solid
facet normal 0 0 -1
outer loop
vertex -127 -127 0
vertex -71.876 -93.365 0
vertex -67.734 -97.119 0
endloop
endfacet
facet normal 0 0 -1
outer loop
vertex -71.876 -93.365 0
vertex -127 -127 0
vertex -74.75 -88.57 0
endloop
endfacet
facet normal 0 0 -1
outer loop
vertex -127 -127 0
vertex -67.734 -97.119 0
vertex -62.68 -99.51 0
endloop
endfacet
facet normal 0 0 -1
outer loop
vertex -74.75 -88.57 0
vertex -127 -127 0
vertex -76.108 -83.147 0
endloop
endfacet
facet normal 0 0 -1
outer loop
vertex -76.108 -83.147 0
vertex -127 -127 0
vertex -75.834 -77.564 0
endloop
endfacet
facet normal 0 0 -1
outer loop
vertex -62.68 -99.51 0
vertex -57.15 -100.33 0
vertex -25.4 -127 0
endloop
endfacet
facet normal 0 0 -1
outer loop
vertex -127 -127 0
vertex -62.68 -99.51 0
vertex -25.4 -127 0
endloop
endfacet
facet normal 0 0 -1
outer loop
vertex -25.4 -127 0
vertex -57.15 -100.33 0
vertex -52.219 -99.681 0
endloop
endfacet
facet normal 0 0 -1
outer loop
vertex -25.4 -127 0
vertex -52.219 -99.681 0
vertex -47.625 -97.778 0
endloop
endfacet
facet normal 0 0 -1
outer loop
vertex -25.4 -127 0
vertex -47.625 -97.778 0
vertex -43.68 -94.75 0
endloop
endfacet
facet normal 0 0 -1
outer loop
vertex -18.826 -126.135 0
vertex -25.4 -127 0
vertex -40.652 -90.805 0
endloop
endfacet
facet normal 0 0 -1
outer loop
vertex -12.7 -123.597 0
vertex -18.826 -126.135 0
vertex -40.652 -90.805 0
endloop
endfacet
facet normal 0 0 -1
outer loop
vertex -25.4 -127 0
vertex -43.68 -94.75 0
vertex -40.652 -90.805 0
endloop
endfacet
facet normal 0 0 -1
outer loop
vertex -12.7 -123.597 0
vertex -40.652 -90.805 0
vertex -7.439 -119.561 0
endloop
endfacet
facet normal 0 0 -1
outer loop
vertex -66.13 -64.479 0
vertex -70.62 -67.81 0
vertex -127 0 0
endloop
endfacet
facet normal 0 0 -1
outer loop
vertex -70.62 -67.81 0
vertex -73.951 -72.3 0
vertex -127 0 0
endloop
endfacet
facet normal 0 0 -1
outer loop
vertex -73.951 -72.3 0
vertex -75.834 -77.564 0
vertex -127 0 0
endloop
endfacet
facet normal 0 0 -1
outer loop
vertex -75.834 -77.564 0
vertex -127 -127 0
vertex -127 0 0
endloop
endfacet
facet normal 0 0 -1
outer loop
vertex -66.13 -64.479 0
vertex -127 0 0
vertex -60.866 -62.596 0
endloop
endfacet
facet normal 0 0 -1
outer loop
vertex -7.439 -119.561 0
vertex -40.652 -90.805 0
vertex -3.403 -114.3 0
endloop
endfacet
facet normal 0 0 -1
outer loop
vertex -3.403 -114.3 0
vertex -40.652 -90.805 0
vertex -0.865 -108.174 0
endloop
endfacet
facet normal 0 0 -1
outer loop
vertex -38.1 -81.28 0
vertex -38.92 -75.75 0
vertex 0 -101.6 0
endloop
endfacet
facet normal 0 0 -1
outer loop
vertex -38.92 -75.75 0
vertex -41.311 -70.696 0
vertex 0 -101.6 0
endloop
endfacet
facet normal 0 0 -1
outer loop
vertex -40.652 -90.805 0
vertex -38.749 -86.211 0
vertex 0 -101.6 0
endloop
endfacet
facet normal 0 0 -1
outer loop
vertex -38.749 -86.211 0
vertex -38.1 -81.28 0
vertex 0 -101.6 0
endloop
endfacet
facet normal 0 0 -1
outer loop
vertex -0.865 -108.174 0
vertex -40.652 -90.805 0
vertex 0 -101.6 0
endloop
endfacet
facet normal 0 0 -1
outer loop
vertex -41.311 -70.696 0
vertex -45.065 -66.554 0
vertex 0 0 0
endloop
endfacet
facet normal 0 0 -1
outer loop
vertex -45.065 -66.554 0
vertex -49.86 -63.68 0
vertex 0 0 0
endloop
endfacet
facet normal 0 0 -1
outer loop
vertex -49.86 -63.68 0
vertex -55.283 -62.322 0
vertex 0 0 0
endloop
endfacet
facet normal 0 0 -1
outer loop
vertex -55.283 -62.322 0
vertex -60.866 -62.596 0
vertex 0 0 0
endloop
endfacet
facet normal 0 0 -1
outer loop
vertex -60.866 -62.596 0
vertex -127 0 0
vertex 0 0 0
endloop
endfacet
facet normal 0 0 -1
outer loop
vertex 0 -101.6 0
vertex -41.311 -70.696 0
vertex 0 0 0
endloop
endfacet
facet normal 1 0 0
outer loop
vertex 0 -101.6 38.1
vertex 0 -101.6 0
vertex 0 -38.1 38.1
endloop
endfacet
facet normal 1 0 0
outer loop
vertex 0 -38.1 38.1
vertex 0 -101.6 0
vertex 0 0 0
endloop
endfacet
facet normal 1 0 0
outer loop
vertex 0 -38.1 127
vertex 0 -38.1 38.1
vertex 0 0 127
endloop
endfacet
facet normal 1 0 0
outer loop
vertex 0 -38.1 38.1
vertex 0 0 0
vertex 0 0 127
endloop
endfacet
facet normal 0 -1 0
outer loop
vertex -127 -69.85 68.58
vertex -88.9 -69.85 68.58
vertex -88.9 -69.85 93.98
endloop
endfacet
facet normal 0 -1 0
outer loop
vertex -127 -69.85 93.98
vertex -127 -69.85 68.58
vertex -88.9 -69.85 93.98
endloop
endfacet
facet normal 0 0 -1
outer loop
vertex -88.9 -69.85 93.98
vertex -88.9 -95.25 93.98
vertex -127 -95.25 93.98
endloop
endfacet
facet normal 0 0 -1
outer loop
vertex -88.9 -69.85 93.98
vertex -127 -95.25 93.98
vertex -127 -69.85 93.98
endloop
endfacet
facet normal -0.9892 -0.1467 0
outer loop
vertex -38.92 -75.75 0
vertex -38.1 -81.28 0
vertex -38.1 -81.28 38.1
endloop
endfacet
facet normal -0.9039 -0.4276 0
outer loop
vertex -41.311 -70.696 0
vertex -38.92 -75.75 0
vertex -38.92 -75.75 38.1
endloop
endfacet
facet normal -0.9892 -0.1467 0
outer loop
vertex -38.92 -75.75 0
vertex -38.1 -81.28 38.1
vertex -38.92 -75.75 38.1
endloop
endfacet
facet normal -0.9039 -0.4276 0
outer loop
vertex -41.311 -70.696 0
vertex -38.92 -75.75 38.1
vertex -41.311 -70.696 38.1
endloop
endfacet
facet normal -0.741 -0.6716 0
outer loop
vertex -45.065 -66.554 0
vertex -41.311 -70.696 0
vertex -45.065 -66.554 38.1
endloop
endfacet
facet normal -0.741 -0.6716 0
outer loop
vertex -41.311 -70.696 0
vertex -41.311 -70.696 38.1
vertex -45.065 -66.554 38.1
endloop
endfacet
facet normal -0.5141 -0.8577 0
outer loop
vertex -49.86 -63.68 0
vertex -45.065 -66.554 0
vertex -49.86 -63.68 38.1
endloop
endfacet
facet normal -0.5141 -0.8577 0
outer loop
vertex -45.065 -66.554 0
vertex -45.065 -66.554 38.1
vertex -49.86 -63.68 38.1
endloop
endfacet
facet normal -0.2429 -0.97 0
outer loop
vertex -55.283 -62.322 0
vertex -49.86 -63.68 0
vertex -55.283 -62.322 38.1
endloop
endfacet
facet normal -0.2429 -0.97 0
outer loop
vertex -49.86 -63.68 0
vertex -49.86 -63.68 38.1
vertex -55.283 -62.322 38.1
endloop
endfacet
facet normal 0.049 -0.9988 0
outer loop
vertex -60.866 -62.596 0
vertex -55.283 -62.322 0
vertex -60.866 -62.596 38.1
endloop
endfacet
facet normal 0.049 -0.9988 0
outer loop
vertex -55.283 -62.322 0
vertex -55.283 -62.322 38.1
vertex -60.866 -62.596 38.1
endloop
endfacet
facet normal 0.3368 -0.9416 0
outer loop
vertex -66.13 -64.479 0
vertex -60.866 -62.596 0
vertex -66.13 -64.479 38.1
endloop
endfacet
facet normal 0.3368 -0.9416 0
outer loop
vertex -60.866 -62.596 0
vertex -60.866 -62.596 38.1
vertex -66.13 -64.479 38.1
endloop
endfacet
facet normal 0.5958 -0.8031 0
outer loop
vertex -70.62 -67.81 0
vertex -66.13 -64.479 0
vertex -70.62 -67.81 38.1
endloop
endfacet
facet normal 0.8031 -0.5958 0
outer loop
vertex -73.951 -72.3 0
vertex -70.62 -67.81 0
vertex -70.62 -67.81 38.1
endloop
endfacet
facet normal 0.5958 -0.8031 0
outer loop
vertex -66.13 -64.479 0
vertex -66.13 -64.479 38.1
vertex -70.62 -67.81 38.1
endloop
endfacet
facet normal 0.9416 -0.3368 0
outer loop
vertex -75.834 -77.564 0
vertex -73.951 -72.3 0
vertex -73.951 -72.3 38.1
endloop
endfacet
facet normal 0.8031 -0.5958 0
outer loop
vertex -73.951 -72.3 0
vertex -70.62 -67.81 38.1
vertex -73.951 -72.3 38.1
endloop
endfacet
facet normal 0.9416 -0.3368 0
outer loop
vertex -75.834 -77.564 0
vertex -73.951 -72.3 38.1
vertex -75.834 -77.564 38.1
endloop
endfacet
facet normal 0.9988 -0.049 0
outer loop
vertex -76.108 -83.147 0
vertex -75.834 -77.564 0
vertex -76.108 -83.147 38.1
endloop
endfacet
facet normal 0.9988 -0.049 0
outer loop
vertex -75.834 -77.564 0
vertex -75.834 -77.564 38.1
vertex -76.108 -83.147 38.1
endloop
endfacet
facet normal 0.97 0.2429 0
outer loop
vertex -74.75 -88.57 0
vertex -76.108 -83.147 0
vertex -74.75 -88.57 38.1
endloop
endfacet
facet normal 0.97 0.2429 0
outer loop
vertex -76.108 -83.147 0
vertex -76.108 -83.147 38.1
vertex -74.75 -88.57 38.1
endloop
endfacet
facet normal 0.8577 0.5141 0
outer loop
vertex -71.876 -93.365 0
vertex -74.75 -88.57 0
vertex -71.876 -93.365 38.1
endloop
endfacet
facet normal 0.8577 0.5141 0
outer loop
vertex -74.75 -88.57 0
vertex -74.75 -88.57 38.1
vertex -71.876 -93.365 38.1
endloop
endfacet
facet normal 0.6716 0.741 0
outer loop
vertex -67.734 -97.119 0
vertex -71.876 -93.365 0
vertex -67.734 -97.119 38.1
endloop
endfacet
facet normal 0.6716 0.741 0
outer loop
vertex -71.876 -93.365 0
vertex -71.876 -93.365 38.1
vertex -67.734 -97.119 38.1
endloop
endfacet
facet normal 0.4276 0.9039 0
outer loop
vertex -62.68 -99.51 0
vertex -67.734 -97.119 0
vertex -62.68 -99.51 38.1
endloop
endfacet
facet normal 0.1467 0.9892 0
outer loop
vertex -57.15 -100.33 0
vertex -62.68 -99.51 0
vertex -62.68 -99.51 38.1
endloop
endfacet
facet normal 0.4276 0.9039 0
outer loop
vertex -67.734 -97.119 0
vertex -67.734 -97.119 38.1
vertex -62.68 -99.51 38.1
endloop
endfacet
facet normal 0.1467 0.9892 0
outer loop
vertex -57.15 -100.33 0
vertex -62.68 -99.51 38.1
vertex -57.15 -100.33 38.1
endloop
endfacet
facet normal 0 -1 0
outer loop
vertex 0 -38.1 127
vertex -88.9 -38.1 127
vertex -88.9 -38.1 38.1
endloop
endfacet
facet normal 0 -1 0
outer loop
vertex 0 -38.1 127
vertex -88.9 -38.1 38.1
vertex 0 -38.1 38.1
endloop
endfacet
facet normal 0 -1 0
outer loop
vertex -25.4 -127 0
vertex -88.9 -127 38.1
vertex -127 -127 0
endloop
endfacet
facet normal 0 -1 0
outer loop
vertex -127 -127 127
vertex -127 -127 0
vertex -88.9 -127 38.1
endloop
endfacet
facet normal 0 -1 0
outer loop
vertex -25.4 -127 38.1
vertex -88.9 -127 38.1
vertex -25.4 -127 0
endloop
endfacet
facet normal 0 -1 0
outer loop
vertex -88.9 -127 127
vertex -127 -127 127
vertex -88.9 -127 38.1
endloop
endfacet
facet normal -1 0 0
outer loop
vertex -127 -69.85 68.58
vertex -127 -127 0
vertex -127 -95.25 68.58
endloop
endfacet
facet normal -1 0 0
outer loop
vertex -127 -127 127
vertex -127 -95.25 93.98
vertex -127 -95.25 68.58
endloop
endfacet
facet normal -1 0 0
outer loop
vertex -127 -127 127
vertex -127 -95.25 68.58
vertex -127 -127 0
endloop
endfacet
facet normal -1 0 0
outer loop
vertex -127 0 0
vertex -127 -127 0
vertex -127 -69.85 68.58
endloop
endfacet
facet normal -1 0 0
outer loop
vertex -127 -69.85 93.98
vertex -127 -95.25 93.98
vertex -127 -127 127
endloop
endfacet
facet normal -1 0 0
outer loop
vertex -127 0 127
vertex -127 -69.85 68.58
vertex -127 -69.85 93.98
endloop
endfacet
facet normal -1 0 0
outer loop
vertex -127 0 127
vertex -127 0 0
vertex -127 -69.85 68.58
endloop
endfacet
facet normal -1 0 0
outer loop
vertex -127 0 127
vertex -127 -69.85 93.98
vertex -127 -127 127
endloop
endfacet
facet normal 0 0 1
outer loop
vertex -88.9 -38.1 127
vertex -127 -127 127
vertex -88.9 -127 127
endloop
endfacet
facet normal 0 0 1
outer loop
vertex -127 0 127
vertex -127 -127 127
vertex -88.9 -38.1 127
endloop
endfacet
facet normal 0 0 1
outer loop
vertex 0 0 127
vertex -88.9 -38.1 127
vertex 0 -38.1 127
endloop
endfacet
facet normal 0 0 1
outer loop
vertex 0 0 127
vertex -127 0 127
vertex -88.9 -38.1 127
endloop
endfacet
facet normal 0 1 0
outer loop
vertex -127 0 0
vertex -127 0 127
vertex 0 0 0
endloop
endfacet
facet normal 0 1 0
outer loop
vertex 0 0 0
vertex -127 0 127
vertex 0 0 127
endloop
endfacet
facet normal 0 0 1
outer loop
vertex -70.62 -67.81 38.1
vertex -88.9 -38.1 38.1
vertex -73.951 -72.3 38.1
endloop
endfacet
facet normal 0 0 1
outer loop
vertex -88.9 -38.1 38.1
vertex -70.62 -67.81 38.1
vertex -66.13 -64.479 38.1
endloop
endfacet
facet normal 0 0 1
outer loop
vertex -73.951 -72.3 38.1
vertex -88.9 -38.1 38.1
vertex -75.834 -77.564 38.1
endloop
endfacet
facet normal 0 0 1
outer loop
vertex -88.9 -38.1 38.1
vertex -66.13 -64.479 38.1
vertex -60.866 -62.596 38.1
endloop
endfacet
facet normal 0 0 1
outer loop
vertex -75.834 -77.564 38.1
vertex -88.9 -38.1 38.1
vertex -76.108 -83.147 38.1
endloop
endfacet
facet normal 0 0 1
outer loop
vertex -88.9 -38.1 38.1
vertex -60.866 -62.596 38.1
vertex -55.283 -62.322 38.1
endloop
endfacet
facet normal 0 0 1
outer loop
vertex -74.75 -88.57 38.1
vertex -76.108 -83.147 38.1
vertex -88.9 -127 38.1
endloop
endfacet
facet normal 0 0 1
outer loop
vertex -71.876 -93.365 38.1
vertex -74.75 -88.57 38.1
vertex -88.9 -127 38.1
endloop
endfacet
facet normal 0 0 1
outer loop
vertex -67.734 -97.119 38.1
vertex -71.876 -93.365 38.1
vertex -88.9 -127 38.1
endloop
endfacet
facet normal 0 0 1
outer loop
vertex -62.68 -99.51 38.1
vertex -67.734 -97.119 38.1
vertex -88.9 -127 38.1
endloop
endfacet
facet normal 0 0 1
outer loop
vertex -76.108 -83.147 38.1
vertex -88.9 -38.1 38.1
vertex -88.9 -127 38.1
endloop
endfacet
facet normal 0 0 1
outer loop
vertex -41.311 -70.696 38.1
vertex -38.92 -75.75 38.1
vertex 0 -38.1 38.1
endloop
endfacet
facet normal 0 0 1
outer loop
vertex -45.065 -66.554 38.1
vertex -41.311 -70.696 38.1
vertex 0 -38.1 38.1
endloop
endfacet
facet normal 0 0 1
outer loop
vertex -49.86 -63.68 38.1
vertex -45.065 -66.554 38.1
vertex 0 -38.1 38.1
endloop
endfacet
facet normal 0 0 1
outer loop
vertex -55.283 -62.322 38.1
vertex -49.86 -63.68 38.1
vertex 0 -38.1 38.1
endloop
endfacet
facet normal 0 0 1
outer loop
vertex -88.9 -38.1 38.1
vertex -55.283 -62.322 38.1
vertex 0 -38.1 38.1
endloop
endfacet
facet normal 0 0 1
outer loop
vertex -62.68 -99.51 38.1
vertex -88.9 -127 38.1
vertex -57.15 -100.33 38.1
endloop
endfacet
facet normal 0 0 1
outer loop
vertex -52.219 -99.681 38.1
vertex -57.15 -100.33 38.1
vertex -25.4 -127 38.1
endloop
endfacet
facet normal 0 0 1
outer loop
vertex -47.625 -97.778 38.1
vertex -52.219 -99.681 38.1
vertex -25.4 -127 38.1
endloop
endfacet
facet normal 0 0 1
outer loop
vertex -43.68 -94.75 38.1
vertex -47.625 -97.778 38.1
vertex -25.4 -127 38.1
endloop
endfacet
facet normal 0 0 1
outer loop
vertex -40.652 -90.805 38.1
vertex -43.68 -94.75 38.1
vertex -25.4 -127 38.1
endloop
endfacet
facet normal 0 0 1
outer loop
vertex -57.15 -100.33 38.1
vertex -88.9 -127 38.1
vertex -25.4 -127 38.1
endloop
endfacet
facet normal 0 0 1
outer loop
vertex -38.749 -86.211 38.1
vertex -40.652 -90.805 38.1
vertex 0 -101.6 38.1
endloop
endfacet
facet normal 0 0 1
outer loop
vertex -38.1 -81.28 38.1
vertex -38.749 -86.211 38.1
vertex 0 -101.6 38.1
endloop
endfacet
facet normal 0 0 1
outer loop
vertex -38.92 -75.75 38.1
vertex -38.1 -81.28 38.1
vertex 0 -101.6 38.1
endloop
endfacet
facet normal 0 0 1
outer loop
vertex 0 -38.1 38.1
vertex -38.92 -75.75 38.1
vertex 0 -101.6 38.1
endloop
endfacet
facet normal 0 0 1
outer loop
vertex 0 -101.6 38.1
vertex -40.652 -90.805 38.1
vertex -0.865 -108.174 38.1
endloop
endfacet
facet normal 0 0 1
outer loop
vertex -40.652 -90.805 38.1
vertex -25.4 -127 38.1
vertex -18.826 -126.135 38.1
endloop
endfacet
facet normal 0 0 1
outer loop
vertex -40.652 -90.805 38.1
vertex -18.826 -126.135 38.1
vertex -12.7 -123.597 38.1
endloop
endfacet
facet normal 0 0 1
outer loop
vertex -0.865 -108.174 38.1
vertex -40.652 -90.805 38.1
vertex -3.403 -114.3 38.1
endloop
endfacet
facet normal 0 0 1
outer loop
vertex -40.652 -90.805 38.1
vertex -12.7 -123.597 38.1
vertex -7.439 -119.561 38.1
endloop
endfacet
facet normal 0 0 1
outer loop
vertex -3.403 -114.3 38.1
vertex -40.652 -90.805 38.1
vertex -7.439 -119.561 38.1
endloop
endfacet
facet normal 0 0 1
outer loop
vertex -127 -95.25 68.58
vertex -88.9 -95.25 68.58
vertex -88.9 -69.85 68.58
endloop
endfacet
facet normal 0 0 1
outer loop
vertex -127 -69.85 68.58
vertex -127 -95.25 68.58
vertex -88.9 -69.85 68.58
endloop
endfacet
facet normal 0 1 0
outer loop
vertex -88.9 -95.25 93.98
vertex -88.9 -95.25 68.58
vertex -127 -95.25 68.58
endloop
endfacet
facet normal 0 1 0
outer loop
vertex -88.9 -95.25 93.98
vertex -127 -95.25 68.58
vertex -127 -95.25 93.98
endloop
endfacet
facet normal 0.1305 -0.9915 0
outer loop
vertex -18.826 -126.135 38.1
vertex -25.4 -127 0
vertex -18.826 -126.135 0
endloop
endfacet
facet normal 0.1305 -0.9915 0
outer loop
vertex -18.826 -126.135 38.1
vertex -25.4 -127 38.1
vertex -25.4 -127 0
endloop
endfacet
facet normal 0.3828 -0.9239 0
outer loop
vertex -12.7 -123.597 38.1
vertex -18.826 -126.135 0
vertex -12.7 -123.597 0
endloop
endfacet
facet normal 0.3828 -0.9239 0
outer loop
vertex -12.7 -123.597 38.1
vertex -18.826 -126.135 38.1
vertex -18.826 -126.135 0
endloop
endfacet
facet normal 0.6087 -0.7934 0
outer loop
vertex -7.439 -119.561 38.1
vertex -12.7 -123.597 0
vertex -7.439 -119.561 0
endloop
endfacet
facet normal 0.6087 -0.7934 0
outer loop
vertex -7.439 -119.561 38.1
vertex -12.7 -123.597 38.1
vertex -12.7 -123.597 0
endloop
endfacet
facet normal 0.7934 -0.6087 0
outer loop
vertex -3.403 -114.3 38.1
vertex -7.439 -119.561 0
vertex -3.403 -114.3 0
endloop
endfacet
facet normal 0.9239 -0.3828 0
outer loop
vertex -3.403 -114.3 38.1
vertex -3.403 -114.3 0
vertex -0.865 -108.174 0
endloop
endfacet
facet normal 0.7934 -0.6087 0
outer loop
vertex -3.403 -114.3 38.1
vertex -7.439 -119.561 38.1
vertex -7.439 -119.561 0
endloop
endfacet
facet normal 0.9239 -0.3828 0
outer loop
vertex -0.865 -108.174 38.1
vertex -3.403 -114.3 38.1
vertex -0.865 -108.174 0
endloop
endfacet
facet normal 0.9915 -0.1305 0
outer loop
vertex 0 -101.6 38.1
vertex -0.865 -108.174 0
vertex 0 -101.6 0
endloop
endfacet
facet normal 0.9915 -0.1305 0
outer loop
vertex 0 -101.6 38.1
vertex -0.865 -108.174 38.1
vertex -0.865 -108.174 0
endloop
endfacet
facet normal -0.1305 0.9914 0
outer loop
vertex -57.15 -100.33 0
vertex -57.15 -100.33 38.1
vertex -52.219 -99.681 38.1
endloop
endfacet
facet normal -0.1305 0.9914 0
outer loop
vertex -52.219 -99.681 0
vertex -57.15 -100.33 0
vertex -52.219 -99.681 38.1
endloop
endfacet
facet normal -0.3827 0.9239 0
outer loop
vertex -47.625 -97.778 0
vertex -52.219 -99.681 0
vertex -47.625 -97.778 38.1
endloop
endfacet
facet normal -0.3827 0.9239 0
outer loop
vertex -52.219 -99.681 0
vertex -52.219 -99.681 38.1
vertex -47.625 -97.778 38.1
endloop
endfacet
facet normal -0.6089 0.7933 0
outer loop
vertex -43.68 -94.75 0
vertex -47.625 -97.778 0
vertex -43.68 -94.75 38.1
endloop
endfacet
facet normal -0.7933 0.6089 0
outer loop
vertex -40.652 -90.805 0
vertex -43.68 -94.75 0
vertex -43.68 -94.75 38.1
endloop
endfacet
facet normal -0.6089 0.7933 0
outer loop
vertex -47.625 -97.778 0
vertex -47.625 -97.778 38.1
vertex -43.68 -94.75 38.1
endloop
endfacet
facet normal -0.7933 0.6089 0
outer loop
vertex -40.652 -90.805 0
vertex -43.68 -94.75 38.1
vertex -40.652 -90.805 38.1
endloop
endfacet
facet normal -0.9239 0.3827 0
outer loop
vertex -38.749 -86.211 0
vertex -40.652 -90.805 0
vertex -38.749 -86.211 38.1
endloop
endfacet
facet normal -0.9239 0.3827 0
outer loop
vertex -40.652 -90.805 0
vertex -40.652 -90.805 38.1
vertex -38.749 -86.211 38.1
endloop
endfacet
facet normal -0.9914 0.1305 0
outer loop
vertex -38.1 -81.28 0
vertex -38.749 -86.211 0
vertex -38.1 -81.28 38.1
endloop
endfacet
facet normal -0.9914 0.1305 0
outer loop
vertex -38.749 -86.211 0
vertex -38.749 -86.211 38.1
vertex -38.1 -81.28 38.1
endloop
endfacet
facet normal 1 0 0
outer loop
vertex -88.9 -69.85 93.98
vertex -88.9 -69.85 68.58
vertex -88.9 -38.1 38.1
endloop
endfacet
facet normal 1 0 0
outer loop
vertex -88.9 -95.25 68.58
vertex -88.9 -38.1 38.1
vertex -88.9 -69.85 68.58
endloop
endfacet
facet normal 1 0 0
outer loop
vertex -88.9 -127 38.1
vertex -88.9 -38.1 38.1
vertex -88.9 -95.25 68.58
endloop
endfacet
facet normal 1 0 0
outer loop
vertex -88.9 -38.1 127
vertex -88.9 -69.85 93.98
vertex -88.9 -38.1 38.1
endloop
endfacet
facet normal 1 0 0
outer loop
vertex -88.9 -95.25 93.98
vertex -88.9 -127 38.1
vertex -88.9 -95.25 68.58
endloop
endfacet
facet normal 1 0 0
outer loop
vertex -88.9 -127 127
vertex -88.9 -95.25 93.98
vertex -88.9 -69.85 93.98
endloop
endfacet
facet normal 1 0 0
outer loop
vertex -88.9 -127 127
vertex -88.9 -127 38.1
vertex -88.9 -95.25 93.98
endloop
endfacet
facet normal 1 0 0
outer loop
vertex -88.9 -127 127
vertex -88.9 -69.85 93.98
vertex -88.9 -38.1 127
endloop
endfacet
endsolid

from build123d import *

# Parameters (mm, degrees)
F0_W     = 127
F0_H     = 127
F1_DEPTH = 127
F2_W     = 88.9
F2_H     = 88.9
F3_DEPTH = 88.9
F4_R     = 25.4
F5_W     = 25.4
F5_H     = 25.4
F6_DEPTH = 38.1
F8_DEPTH = 38.1


with BuildPart() as f1:
    # F0 (on Front) → F1 (new body)
    with BuildSketch(Plane.XZ):
        with Locations((-63.5, 63.5)):
            Rectangle(F0_W, F0_H)
    extrude(amount=F1_DEPTH)

    # F2 (on face) → F3 (cut)
    with BuildSketch(Plane.XZ.offset(127)):
        with Locations((-44.45, 82.55)):
            Rectangle(F2_W, F2_H)
    extrude(amount=-F3_DEPTH, mode=Mode.SUBTRACT)

    # F4
    f4_edges = [f1.edges().sort_by_distance(p)[0] for p in [
        (0, -127, 19.05),
    ]]
    fillet(f4_edges, radius=F4_R)

    # F5 (on face) → F6 (cut)
    with BuildSketch(Plane.YZ.offset(-88.9)):
        with Locations((-82.55, 81.28)):
            Rectangle(F5_W, F5_H)
    extrude(amount=-F6_DEPTH, mode=Mode.SUBTRACT)

    # F7 (on face) → F8 (cut)
    with BuildSketch(Plane.XY.offset(38.1)):
        with BuildLine():
            ThreePointArc((-38.1, -81.28), (-70.620384, -67.809616), (-57.15, -100.33))
            ThreePointArc((-57.15, -100.33), (-43.679616, -94.750384), (-38.1, -81.28))
        make_face()
    extrude(amount=-F8_DEPTH, mode=Mode.SUBTRACT)


solid = f1.part
